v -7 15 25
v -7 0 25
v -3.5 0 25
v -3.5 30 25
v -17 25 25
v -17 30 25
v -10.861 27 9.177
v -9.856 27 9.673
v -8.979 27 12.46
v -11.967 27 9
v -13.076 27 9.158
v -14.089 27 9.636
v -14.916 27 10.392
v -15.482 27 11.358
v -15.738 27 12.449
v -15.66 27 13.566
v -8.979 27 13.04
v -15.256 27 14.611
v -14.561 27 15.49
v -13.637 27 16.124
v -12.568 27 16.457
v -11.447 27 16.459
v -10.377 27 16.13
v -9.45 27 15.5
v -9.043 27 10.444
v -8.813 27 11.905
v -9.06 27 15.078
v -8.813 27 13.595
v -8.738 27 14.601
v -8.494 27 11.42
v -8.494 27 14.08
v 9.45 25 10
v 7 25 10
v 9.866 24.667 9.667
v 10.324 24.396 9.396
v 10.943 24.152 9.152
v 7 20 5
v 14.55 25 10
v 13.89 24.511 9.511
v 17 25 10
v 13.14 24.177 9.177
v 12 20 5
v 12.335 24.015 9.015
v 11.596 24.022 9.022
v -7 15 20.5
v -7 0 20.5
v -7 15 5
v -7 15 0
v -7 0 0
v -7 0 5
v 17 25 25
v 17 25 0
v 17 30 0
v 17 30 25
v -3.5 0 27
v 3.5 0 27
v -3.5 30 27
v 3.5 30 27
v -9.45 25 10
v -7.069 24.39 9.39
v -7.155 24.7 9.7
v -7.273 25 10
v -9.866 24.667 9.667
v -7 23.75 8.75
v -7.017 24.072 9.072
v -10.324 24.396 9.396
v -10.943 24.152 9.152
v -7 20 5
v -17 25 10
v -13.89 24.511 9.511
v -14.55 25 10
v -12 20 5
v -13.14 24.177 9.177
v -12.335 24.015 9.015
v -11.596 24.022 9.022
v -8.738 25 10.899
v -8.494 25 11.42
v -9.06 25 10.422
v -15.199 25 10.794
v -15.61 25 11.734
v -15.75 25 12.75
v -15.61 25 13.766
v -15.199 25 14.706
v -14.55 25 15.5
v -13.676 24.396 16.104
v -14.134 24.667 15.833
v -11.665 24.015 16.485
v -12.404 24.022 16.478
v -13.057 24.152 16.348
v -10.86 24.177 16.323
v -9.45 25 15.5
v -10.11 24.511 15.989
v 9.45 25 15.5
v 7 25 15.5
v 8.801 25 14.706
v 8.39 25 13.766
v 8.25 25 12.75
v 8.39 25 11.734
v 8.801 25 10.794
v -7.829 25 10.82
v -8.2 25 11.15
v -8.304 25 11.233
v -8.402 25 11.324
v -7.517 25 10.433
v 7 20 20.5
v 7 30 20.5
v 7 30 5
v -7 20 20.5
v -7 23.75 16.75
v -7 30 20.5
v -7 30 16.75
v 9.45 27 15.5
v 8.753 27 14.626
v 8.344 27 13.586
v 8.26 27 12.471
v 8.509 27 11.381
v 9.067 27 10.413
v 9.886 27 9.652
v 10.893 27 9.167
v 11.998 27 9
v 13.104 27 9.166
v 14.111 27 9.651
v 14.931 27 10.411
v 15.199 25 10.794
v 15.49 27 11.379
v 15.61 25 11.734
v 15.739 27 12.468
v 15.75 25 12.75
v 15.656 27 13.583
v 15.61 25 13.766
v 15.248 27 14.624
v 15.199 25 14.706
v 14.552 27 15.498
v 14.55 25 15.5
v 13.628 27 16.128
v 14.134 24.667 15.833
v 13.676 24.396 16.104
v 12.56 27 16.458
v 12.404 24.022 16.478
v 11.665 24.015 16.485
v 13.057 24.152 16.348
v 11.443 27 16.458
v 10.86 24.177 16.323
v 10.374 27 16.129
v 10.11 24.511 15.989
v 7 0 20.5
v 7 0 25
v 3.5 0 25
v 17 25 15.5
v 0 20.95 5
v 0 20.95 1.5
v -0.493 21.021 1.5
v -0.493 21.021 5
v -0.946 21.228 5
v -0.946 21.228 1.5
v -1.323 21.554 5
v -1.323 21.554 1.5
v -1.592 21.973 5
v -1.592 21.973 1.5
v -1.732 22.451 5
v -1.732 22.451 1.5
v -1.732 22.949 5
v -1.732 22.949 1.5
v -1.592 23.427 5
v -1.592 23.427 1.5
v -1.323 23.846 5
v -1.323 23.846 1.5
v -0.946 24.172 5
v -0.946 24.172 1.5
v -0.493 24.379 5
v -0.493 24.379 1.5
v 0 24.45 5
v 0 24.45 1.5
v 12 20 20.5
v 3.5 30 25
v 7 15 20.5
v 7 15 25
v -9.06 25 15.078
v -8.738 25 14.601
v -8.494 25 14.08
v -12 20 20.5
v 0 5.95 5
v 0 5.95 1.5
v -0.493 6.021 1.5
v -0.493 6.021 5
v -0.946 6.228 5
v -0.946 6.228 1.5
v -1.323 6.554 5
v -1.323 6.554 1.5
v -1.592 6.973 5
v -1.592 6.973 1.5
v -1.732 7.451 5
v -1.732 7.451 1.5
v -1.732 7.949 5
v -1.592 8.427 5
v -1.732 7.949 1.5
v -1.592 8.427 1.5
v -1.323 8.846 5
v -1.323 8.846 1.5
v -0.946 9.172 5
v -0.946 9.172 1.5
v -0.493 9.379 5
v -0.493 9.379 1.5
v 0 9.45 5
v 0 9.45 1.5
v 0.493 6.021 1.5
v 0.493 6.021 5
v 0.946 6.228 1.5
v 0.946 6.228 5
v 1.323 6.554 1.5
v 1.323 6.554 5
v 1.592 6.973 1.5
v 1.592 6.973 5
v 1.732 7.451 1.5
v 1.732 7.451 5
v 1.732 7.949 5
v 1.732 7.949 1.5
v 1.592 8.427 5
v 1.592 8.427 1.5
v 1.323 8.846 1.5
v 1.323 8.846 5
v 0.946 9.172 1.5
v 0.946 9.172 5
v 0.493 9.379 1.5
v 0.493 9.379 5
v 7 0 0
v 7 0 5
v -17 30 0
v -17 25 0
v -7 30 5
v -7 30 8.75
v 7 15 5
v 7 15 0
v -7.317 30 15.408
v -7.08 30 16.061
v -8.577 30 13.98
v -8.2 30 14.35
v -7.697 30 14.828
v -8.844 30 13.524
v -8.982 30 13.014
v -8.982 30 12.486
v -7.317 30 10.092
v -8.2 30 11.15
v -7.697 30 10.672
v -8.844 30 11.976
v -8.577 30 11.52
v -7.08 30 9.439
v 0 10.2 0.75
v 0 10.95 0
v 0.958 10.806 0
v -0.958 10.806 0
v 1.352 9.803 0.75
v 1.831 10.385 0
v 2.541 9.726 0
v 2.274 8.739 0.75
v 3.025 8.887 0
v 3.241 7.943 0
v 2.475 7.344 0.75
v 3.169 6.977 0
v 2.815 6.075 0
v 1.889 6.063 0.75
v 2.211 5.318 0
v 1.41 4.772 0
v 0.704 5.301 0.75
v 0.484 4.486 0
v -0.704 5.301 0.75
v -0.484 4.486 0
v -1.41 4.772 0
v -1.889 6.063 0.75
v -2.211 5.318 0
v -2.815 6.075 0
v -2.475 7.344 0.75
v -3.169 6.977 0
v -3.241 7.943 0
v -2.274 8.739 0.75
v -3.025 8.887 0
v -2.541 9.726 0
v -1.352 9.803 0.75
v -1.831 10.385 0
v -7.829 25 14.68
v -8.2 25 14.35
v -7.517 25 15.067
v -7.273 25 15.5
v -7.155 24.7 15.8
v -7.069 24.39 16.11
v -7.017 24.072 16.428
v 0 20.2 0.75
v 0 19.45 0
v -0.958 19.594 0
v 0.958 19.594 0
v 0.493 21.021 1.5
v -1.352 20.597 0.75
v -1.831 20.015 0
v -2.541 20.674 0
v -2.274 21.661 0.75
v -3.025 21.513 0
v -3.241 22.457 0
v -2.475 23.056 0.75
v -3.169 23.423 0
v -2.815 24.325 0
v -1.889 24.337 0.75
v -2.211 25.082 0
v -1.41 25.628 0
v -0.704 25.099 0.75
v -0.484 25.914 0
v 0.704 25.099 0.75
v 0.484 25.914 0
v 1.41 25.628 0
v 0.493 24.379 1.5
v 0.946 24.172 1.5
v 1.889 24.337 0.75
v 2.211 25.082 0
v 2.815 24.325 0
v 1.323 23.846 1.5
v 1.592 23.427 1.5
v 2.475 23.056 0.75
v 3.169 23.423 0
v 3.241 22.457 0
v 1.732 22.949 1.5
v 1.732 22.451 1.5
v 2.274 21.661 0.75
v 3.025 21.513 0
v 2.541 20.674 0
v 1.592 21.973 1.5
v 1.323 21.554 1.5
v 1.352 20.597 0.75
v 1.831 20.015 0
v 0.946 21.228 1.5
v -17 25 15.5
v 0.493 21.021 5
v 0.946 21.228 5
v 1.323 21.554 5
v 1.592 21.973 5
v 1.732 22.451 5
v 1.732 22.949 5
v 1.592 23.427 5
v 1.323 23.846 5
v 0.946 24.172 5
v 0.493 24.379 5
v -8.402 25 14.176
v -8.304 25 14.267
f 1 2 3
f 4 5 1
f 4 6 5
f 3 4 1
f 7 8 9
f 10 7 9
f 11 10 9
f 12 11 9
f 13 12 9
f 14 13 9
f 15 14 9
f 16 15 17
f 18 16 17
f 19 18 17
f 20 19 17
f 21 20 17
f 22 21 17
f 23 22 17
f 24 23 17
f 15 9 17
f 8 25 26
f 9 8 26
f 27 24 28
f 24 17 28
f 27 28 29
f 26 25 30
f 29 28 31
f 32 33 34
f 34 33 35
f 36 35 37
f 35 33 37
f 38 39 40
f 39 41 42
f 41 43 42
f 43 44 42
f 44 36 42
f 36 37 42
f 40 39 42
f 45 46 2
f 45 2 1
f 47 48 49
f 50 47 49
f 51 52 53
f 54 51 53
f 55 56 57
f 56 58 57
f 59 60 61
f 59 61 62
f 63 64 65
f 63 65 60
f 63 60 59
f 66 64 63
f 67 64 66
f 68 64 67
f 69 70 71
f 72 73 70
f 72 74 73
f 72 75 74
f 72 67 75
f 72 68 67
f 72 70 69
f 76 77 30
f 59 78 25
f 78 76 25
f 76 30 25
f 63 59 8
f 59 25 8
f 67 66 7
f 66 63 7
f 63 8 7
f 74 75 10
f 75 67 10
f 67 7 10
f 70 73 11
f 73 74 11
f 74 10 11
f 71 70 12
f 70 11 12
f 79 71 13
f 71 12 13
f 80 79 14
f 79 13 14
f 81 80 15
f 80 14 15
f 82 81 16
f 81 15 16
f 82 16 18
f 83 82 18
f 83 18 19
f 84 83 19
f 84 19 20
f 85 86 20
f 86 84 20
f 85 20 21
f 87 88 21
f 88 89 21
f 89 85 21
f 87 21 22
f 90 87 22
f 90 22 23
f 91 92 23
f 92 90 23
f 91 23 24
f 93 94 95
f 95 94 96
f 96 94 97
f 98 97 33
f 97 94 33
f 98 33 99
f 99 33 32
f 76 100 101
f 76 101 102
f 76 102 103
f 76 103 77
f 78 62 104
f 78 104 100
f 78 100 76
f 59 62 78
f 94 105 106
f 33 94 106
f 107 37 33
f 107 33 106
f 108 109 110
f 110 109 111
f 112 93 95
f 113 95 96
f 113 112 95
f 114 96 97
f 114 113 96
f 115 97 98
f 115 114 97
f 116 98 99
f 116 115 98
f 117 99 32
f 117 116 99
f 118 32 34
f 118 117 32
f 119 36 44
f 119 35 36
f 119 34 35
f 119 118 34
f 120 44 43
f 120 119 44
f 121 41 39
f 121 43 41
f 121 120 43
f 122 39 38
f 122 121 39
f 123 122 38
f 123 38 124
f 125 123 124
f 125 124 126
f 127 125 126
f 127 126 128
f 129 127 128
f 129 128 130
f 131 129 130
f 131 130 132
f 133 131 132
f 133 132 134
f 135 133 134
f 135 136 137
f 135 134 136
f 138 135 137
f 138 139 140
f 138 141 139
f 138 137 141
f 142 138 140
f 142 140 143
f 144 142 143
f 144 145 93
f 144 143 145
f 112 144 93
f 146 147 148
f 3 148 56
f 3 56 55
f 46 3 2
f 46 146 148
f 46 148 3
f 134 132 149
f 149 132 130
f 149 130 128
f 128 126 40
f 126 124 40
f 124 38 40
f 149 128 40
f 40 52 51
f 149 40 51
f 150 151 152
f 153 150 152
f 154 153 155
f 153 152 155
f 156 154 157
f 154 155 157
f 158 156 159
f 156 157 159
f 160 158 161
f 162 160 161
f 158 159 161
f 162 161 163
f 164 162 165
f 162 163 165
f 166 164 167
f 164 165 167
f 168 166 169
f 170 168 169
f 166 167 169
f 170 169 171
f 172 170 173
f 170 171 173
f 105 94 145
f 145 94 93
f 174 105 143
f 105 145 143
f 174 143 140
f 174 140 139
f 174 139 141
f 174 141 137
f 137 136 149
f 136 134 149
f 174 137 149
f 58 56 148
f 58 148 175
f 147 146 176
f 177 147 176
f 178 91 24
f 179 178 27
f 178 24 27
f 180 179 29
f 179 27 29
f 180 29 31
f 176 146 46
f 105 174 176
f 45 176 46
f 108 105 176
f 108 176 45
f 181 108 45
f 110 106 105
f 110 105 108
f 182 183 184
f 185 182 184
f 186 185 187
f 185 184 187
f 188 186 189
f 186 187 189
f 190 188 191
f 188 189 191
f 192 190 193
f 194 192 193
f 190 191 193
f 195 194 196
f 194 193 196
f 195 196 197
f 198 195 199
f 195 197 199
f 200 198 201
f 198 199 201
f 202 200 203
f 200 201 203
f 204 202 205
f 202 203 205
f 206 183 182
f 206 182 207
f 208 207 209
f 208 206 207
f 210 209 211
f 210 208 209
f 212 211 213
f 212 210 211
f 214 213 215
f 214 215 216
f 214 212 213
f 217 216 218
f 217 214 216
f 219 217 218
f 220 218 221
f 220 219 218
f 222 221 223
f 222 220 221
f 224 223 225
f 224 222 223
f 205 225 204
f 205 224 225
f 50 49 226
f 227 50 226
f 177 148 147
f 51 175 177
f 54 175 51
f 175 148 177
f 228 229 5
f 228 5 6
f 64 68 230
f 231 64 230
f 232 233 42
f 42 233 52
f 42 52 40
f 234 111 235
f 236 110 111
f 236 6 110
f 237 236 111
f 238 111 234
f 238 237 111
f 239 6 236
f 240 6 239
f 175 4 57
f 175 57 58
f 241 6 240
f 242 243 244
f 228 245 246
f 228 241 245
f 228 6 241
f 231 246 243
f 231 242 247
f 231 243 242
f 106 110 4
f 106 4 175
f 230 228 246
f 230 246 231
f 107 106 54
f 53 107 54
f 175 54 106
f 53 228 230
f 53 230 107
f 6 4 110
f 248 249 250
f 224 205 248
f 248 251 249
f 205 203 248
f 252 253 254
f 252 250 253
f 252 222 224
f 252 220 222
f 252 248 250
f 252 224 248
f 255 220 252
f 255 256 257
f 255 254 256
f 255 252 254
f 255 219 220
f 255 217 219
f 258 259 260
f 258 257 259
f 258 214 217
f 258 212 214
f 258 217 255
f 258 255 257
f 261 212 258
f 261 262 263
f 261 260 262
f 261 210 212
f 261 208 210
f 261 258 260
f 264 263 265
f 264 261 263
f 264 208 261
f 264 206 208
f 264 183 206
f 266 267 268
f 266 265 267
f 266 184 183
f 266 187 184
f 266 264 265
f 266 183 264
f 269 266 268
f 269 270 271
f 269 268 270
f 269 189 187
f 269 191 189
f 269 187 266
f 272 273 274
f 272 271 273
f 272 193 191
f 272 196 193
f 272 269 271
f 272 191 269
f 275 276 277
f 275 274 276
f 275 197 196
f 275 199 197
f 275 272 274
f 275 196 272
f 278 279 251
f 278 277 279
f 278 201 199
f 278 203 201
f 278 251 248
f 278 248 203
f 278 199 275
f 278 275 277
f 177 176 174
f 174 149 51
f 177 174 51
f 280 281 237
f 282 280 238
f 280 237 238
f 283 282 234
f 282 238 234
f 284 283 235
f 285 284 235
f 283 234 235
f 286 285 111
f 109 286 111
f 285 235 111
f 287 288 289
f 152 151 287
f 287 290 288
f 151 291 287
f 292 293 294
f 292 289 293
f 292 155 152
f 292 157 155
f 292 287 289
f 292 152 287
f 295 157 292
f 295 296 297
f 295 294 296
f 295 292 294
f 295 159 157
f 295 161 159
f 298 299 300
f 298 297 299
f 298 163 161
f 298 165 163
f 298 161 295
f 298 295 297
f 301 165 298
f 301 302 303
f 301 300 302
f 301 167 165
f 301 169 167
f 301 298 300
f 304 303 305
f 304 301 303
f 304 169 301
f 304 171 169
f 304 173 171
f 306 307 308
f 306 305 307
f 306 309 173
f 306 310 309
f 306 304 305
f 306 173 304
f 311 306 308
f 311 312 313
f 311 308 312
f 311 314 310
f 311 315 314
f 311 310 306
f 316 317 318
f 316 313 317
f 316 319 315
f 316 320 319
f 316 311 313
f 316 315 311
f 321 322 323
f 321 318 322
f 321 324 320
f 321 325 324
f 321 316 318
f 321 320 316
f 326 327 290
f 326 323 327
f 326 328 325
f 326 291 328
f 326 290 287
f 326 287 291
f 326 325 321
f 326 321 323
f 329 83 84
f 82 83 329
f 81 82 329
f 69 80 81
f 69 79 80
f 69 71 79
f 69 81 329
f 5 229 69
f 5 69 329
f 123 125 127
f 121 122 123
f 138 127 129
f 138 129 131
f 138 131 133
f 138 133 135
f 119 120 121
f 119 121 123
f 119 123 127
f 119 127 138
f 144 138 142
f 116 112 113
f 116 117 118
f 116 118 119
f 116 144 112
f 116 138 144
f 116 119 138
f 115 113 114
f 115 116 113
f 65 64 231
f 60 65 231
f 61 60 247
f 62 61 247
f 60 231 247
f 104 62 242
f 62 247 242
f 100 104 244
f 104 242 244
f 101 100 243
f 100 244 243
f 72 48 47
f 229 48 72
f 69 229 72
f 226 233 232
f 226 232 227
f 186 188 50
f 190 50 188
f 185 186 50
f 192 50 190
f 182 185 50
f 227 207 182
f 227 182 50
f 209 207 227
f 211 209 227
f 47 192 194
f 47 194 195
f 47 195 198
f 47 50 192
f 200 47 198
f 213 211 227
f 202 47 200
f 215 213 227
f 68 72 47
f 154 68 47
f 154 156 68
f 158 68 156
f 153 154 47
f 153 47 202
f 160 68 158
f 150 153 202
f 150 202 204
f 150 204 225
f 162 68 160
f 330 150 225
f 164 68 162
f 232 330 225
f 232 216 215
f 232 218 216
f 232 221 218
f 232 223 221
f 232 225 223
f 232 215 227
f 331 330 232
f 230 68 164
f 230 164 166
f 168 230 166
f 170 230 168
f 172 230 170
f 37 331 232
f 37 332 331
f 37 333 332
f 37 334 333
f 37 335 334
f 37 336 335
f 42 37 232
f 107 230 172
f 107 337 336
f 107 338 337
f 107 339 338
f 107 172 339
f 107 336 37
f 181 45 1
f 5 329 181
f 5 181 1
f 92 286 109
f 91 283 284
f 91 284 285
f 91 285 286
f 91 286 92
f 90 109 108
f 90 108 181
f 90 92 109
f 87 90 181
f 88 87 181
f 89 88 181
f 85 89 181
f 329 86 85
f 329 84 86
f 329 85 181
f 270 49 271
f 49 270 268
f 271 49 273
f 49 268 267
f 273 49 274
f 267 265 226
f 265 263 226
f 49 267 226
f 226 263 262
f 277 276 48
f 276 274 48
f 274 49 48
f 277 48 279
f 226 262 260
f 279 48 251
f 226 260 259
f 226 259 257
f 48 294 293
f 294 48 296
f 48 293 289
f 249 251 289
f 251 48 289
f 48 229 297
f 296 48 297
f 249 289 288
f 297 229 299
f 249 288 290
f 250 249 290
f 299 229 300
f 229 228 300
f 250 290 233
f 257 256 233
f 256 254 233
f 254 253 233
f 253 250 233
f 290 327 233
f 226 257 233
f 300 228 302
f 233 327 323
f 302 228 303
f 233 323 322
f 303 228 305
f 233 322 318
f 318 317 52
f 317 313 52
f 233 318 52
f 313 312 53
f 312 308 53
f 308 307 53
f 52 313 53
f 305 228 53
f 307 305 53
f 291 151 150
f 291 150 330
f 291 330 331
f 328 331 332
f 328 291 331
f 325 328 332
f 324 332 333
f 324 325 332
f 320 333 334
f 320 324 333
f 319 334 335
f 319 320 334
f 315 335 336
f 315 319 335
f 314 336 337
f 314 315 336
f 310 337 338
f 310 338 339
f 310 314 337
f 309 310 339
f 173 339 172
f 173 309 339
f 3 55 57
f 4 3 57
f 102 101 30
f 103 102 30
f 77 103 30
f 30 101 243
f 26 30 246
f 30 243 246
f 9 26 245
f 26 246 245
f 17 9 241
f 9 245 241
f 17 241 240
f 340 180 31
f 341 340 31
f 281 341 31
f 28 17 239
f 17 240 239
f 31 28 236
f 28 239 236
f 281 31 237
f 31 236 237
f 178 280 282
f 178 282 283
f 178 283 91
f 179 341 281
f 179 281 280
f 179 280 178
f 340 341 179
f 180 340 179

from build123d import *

# Parameters (mm, degrees)
BOSS_EXTRUDE1_DEPTH     = 5
SKETCH2_W               = 10
SKETCH2_H               = 5
BOSS_EXTRUDE2_DEPTH     = 15.5
BOSS_EXTRUDE3_DEPTH     = 6.5
CHAMFER1_SIZE           = 10
CHAMFER2_SIZE           = 5
CUT_EXTRUDE1_DEPTH      = 5
CUT_EXTRUDE1_DEPTH_BACK = 2
SKETCH4_R               = 3.75
SKETCH5_W               = 13.5
SKETCH5_H               = 30
CUT_EXTRUDE2_DEPTH      = 2
CHAMFER3_SIZE           = 1.5
SKETCH6_R               = 2
CUT_EXTRUDE4_DEPTH      = 44.794976881
FILLET1_R               = 3


with BuildPart() as part:
    # Sketch1 → Boss-Extrude1 (new body)
    with BuildSketch(Plane.XY):
        with BuildLine():
            Line((0, 24.45), (0, 30))
            Line((0, 30), (17, 30))
            Line((17, 30), (17, 25))
            Line((17, 25), (7, 25))
            Line((7, 25), (7, 0))
            Line((7, 0), (0, 0))
            Line((0, 0), (0, 5.95))
            ThreePointArc((0, 5.95), (1.75, 7.7), (0, 9.45))
            Line((0, 9.45), (0, 20.95))
            ThreePointArc((0, 20.95), (1.75, 22.7), (0, 24.45))
        make_face()
    extrude(amount=BOSS_EXTRUDE1_DEPTH)

    # Sketch2 → Boss-Extrude2 (add)
    with BuildSketch(Plane.XY.offset(5)):
        with Locations((12, 27.5)):
            Rectangle(SKETCH2_W, SKETCH2_H)
    extrude(amount=BOSS_EXTRUDE2_DEPTH)

    # Sketch3 → Boss-Extrude3 (add)
    with BuildSketch(Plane.XY.offset(20.5)):
        Polygon((7, 0), (7, 25), (17, 25), (17, 30), (0, 30), (0, 0), align=None)
    extrude(amount=BOSS_EXTRUDE3_DEPTH)

    # Chamfer1
    chamfer1_edges = [part.edges().sort_by_distance(p)[0] for p in [
        (7, 25, 2.5),
        (7, 25, 23.75),
    ]]
    chamfer(chamfer1_edges, length=CHAMFER1_SIZE - 0.0001)  # a hair under: the kernel refuses the full size

    # Chamfer2
    chamfer2_edges = [part.edges().sort_by_distance(p)[0] for p in [
        (11.99995, 25, 5),
        (11.99995, 25, 20.5),
    ]]
    chamfer(chamfer2_edges, length=CHAMFER2_SIZE)

    # Sketch4 → Cut-Extrude1 (cut, two sides: drawn at the far end of the back side and taken through both)
    with BuildSketch(Plane.XZ.offset(-25).offset(-CUT_EXTRUDE1_DEPTH_BACK)):
        with Locations(Location((12, 12.75, 0), (0, 0, 132.833428066))):
            Circle(SKETCH4_R)
    extrude(amount=CUT_EXTRUDE1_DEPTH + CUT_EXTRUDE1_DEPTH_BACK, mode=Mode.SUBTRACT)

    # Mirror1: part across plane


with BuildPart() as part_1:
    add(part.part)
    add(part.part.mirror(Plane(origin=(0, 30, 27), x_dir=(0, 0, 1), z_dir=(1, 0, 0))))

    # Sketch5 → Cut-Extrude2 (cut)
    with BuildSketch(Plane.XY.offset(27)):
        with Locations((-10.25, 15)):
            Rectangle(SKETCH5_W, SKETCH5_H)
        with Locations((10.25, 15)):
            Rectangle(SKETCH5_W, SKETCH5_H)
    extrude(amount=-CUT_EXTRUDE2_DEPTH, mode=Mode.SUBTRACT)

    # Chamfer3
    chamfer3_edges = [part_1.edges().sort_by_distance(p)[0] for p in [
        (0, 9.45, 0),
        (0, 24.45, 0),
    ]]
    chamfer(chamfer3_edges, length=CHAMFER3_SIZE)

    # Sketch6 → Cut-Extrude4 (cut, through all)
    with BuildSketch(Plane(origin=(0, 30, 0), x_dir=(1, 0, 0), z_dir=(0, 1, 0))):
        with Locations((-7, -12.75)):
            Circle(SKETCH6_R)
    extrude(amount=-CUT_EXTRUDE4_DEPTH, mode=Mode.SUBTRACT)

    # Fillet1
    fillet1_edges = [part_1.edges().sort_by_distance(p)[0] for p in [
        (-7, 27.5, 14.75),
        (-7, 27.5, 10.75),
    ]]
    fillet(fillet1_edges, radius=FILLET1_R)


solid = part_1.part
